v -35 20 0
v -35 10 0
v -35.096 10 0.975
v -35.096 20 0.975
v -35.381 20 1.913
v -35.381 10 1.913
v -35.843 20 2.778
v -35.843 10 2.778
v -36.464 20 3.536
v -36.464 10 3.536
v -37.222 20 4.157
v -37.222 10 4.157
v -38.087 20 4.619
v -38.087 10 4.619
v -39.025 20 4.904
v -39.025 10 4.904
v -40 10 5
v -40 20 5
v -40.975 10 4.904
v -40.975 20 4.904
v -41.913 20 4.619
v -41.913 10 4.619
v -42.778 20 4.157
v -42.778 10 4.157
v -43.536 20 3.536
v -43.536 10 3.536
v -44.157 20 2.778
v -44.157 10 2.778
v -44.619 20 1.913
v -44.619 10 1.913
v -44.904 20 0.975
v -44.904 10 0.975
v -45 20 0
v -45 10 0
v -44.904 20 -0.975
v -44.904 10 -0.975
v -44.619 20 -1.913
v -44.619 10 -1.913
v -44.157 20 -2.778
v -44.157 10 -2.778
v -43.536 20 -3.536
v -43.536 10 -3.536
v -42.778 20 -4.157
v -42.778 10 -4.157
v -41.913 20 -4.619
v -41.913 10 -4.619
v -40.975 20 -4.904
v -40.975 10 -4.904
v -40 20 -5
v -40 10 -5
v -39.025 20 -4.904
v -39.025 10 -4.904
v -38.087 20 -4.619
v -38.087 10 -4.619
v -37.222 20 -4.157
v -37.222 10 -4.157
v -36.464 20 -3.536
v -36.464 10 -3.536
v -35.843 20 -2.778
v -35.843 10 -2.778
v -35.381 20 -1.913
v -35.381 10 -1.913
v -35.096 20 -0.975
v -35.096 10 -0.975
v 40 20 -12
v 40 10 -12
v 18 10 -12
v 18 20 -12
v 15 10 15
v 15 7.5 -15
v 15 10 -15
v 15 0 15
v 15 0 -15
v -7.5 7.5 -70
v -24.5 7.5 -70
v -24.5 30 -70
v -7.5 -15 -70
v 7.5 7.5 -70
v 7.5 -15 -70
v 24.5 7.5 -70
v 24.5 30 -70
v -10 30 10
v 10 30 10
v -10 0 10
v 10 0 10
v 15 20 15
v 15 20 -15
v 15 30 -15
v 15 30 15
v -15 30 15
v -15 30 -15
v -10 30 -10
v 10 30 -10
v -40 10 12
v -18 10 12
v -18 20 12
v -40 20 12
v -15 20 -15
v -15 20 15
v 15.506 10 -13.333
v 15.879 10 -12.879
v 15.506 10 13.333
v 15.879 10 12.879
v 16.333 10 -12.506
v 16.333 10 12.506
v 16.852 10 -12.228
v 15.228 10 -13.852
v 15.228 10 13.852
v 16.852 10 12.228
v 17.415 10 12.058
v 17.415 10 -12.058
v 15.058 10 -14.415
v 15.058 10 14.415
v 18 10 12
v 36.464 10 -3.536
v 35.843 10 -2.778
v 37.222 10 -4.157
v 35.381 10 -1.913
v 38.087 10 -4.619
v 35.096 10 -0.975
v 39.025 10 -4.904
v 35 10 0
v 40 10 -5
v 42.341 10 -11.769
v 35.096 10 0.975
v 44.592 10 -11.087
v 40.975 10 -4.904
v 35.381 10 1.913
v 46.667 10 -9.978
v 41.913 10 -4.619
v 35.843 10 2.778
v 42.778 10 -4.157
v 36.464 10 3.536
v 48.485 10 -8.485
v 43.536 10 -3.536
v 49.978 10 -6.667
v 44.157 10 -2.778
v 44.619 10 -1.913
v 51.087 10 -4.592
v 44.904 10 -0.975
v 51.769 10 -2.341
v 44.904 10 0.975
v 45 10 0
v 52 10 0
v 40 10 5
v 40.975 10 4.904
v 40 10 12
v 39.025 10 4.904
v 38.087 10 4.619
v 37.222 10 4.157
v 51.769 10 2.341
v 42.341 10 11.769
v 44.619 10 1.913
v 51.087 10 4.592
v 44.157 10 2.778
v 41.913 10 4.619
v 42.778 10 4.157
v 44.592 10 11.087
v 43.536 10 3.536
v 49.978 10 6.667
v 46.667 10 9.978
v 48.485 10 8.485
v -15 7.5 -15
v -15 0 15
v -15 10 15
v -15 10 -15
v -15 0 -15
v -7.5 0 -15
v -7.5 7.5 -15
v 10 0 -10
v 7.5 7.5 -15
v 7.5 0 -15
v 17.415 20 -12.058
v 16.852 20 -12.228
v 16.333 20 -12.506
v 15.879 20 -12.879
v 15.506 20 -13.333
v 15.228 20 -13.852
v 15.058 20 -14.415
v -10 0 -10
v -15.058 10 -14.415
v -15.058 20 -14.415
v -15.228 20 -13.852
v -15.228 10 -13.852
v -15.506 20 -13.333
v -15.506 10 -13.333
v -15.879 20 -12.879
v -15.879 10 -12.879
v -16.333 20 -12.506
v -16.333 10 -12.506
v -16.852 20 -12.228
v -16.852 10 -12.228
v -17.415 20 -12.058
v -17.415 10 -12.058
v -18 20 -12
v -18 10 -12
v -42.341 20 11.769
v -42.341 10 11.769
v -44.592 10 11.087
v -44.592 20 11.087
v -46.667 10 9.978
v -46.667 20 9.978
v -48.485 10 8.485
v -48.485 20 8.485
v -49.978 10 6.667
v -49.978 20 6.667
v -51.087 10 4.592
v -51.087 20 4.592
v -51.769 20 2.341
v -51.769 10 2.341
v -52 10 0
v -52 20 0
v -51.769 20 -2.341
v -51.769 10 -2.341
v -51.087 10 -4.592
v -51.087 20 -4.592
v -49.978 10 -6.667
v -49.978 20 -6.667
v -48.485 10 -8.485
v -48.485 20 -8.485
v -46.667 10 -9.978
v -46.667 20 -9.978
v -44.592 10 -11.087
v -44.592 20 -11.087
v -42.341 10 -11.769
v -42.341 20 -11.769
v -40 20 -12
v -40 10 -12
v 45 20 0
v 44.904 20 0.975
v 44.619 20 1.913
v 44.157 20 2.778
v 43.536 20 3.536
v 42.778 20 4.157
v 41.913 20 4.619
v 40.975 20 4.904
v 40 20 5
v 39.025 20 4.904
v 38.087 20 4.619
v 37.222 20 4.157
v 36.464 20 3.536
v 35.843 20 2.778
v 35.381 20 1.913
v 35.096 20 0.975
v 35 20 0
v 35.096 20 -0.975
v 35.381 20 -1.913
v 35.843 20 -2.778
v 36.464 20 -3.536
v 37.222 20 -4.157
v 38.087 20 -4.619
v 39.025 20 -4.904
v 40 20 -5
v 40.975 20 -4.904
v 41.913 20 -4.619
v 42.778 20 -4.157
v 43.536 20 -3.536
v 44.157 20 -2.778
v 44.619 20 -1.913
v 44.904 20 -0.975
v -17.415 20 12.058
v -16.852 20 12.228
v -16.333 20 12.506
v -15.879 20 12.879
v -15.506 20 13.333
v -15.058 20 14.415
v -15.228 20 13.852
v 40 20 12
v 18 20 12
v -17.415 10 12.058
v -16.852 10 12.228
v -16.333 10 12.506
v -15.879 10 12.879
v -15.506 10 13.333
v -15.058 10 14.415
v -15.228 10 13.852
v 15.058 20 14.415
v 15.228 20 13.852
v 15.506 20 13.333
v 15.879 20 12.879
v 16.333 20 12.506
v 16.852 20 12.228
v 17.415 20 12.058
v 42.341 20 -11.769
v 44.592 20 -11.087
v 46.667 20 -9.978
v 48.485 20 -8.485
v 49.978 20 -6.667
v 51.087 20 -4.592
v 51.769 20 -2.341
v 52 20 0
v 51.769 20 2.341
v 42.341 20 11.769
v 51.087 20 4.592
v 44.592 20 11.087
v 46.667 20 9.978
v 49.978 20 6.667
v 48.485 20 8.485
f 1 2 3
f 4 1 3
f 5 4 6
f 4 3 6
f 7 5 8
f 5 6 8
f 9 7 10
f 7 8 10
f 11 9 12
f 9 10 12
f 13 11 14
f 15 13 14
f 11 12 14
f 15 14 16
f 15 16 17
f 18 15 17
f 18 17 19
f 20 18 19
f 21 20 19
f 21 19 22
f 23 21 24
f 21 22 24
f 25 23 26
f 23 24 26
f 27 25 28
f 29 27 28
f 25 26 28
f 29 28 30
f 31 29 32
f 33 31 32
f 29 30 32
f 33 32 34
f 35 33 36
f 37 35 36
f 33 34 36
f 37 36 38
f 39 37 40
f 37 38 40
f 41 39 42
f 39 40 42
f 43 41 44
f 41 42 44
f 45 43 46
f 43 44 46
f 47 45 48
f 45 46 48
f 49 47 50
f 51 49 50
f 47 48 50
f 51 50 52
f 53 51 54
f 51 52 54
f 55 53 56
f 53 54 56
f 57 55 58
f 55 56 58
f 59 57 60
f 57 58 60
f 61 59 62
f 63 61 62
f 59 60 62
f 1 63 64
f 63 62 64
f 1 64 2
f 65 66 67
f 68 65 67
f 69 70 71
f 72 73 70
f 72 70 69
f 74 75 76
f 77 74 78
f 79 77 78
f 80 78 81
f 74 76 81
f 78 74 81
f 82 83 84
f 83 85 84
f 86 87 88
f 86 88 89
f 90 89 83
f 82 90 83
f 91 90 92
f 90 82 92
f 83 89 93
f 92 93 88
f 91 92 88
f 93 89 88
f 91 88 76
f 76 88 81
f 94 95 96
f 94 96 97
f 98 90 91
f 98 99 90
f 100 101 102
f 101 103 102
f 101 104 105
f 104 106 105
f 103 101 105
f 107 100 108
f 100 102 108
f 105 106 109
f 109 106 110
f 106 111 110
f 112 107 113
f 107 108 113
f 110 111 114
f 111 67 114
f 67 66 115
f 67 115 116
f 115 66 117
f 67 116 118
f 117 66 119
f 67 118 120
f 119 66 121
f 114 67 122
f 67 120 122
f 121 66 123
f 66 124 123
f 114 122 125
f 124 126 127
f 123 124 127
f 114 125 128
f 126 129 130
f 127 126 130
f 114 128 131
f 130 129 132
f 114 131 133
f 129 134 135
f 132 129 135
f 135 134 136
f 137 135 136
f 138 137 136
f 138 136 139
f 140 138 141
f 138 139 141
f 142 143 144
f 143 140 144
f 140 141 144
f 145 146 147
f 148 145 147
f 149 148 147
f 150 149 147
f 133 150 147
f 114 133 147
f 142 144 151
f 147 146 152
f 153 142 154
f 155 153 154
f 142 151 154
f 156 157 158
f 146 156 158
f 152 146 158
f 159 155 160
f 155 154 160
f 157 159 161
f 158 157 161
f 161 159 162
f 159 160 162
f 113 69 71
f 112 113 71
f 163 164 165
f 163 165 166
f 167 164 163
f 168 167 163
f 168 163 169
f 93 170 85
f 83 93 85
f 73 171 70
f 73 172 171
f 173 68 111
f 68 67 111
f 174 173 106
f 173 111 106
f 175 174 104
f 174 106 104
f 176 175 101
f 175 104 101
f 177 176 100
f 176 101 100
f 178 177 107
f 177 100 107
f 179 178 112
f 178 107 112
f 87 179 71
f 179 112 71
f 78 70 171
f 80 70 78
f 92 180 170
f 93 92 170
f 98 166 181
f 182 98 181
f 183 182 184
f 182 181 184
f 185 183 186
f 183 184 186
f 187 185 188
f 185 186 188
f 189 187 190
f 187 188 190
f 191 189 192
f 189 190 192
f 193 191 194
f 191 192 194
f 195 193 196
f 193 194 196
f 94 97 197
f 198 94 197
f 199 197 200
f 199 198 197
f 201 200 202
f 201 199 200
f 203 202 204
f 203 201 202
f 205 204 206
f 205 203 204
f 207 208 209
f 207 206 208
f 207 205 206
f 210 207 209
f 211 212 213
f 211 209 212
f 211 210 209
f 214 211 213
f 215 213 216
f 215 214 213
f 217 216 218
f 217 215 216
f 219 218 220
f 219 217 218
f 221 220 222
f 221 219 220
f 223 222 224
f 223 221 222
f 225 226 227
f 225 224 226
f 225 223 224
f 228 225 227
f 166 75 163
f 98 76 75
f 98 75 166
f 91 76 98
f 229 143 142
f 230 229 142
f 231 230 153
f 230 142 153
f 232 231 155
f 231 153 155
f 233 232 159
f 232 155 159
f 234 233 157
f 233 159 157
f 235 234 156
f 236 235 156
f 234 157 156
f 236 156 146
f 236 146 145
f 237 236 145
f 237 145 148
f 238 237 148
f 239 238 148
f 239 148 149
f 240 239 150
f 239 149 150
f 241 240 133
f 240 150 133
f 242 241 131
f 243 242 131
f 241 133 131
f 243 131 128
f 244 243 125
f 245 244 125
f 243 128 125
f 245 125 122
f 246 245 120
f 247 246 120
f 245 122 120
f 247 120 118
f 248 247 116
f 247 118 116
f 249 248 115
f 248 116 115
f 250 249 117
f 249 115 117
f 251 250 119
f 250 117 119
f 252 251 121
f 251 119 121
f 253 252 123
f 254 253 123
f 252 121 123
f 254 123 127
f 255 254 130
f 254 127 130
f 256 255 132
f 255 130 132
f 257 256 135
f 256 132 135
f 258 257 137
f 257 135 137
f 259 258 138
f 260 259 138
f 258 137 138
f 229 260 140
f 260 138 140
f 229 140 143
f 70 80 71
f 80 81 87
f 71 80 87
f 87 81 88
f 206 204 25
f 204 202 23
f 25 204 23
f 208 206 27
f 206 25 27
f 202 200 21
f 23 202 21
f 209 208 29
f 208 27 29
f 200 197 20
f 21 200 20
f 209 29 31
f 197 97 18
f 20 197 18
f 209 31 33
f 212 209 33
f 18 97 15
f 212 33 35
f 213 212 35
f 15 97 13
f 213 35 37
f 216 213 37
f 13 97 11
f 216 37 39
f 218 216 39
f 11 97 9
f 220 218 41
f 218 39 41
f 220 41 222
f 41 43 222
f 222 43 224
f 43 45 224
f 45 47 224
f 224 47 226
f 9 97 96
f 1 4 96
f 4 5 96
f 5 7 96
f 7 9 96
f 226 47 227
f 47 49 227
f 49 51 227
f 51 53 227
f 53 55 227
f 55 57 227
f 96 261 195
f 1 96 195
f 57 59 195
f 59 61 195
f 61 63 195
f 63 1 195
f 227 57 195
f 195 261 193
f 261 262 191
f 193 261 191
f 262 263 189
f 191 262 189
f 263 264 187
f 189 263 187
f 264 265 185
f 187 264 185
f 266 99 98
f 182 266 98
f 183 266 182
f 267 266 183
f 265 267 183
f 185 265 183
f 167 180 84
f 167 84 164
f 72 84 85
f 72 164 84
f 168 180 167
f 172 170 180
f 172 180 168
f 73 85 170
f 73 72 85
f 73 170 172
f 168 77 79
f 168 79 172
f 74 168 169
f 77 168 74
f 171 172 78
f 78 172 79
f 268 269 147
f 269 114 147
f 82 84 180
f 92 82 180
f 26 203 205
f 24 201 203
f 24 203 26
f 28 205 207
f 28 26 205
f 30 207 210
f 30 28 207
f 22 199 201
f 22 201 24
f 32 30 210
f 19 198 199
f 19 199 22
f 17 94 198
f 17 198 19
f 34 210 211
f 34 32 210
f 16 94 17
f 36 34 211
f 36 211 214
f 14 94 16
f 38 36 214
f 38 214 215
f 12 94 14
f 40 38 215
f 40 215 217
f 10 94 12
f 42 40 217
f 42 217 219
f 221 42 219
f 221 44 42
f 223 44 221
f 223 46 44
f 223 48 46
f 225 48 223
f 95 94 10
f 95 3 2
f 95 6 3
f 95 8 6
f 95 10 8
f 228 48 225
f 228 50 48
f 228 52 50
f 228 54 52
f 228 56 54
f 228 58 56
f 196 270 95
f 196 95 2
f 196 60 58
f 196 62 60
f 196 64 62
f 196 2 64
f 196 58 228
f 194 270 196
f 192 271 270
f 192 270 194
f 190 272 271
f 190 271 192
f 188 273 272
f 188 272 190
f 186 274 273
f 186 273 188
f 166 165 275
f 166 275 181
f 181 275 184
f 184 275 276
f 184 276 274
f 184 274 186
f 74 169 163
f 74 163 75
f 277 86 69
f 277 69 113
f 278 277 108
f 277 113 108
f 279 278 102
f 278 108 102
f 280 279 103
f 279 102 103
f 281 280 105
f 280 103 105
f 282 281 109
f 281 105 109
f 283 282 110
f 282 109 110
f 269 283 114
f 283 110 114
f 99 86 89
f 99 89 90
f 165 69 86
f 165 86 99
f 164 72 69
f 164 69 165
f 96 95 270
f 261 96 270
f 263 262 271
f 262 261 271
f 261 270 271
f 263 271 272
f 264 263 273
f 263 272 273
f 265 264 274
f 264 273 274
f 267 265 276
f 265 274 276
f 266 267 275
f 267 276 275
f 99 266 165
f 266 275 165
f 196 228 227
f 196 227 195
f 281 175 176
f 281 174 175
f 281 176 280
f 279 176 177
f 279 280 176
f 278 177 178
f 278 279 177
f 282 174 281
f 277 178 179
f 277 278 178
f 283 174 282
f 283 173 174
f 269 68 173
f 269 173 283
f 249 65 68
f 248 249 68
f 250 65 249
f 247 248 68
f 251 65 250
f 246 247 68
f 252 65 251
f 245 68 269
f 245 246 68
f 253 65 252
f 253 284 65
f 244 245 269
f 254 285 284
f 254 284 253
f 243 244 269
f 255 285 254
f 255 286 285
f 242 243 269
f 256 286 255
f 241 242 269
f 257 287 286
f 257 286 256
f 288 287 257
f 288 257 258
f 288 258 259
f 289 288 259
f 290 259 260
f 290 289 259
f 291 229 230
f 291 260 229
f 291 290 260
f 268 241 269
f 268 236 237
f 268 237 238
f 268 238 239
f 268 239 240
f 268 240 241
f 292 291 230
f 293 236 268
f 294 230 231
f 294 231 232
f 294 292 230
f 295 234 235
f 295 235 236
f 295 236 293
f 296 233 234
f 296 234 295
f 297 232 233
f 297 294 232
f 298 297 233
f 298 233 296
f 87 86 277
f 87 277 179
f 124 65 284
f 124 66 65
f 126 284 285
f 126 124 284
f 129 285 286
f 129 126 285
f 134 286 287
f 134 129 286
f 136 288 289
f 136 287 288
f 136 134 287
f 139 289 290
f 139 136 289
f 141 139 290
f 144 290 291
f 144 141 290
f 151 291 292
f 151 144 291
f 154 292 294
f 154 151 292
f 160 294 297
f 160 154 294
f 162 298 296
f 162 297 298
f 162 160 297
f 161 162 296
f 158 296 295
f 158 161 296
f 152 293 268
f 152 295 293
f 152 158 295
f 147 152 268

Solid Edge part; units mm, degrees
sketch "Sketch1" plane through (0, 0, 0) normal (0, -1, 0) x (1, 0, 0)
  line L0 (15, -15) -> (15, 15)
  line L1 (15, 15) -> (-15, 15)
  line L2 (-15, 15) -> (-15, -15)
  line L3 (-15, -15) -> (15, -15)
extrude "Protrusion1" add sketch "Sketch1" against normal blind 30
sketch "Sketch2" plane through (0, 0, 0) normal (0, -1, 0) x (1, 0, 0)
  line L0 (10, 10) -> (-10, 10)
  line L1 (-10, 10) -> (-10, -10)
  line L2 (-10, -10) -> (10, -10)
  line L3 (10, -10) -> (10, 10)
extrude "ExtrudedCutout_1" cut sketch "Sketch2" against normal blind 30
sketch "Sketch3" plane through (0, 10, 0) normal (0, -1, 0) x (1, 0, 0)
  line L0 (18, 12) -> (40, 12)
  line L1 (40, -12) -> (18, -12)
  line L2 (15, -15) -> (15, 15)
  arc A0 (40, 12) -> (40, -12) centre (40, 0) cw
  arc A1 (15, -15) -> (18, -12) centre (18, -15) cw
  arc A2 (18, 12) -> (15, 15) centre (18, 15) cw
extrude "ExtrudedProtrusion_2" add sketch "Sketch3" against normal blind 10
sketch "Sketch4" plane through (0, 10, 0) normal (0, -1, 0) x (1, 0, 0)
  circle A0 centre (40, 0) radius 5
extrude "ExtrudedCutout_2" cut sketch "Sketch4" against normal blind 10
sketch "Sketch5" plane through (33.5, 10, 0) normal (0, -1, 0) x (1, 0, 0)
  line L0 (-51.5, 12) -> (-73.5, 12)
  line L1 (-73.5, -12) -> (-51.5, -12)
  line L2 (-48.5, -15) -> (-48.5, 15)
  arc A0 (-73.5, -12) -> (-73.5, 12) centre (-73.5, 0) cw
  arc A1 (-51.5, -12) -> (-48.5, -15) centre (-51.5, -15) cw
  arc A2 (-48.5, 15) -> (-51.5, 12) centre (-51.5, 15) cw
extrude "ExtrudedProtrusion_3" add sketch "Sketch5" against normal blind 10
sketch "Sketch6" plane through (33.5, 10, 0) normal (0, -1, 0) x (1, 0, 0)
  circle A0 centre (-73.5, 0) radius 5
extrude "ExtrudedCutout_3" cut sketch "Sketch6" against normal blind 10
sketch "Sketch7" plane through (0, 30, 0) normal (0, 1, 0) x (-1, 0, 0)
  line L0 (-24.5, -70) -> (-15, -15)
  line L1 (-15, -15) -> (15, -15)
  line L2 (24.5, -70) -> (15, -15)
  line L3 (15, -70) -> (24.5, -70)
  line L4 (15, -70) -> (-15, -70)
  line L5 (-15, -70) -> (-24.5, -70)
extrude "ExtrudedProtrusion_4" add sketch "Sketch7" against normal blind 22.5
sketch "Sketch8" plane through (-7.5, 5, 0) normal (-1, 0, 0) x (0, -1, 0)
  line L0 (20, -70) -> (5, -15)
  line L1 (-2.5, -15) -> (5, -15)
  line L2 (-2.5, -15) -> (-2.5, -70)
  line L3 (-2.5, -70) -> (20, -70)
extrude "ExtrudedProtrusion_7" add sketch "Sketch8" against normal blind 15
